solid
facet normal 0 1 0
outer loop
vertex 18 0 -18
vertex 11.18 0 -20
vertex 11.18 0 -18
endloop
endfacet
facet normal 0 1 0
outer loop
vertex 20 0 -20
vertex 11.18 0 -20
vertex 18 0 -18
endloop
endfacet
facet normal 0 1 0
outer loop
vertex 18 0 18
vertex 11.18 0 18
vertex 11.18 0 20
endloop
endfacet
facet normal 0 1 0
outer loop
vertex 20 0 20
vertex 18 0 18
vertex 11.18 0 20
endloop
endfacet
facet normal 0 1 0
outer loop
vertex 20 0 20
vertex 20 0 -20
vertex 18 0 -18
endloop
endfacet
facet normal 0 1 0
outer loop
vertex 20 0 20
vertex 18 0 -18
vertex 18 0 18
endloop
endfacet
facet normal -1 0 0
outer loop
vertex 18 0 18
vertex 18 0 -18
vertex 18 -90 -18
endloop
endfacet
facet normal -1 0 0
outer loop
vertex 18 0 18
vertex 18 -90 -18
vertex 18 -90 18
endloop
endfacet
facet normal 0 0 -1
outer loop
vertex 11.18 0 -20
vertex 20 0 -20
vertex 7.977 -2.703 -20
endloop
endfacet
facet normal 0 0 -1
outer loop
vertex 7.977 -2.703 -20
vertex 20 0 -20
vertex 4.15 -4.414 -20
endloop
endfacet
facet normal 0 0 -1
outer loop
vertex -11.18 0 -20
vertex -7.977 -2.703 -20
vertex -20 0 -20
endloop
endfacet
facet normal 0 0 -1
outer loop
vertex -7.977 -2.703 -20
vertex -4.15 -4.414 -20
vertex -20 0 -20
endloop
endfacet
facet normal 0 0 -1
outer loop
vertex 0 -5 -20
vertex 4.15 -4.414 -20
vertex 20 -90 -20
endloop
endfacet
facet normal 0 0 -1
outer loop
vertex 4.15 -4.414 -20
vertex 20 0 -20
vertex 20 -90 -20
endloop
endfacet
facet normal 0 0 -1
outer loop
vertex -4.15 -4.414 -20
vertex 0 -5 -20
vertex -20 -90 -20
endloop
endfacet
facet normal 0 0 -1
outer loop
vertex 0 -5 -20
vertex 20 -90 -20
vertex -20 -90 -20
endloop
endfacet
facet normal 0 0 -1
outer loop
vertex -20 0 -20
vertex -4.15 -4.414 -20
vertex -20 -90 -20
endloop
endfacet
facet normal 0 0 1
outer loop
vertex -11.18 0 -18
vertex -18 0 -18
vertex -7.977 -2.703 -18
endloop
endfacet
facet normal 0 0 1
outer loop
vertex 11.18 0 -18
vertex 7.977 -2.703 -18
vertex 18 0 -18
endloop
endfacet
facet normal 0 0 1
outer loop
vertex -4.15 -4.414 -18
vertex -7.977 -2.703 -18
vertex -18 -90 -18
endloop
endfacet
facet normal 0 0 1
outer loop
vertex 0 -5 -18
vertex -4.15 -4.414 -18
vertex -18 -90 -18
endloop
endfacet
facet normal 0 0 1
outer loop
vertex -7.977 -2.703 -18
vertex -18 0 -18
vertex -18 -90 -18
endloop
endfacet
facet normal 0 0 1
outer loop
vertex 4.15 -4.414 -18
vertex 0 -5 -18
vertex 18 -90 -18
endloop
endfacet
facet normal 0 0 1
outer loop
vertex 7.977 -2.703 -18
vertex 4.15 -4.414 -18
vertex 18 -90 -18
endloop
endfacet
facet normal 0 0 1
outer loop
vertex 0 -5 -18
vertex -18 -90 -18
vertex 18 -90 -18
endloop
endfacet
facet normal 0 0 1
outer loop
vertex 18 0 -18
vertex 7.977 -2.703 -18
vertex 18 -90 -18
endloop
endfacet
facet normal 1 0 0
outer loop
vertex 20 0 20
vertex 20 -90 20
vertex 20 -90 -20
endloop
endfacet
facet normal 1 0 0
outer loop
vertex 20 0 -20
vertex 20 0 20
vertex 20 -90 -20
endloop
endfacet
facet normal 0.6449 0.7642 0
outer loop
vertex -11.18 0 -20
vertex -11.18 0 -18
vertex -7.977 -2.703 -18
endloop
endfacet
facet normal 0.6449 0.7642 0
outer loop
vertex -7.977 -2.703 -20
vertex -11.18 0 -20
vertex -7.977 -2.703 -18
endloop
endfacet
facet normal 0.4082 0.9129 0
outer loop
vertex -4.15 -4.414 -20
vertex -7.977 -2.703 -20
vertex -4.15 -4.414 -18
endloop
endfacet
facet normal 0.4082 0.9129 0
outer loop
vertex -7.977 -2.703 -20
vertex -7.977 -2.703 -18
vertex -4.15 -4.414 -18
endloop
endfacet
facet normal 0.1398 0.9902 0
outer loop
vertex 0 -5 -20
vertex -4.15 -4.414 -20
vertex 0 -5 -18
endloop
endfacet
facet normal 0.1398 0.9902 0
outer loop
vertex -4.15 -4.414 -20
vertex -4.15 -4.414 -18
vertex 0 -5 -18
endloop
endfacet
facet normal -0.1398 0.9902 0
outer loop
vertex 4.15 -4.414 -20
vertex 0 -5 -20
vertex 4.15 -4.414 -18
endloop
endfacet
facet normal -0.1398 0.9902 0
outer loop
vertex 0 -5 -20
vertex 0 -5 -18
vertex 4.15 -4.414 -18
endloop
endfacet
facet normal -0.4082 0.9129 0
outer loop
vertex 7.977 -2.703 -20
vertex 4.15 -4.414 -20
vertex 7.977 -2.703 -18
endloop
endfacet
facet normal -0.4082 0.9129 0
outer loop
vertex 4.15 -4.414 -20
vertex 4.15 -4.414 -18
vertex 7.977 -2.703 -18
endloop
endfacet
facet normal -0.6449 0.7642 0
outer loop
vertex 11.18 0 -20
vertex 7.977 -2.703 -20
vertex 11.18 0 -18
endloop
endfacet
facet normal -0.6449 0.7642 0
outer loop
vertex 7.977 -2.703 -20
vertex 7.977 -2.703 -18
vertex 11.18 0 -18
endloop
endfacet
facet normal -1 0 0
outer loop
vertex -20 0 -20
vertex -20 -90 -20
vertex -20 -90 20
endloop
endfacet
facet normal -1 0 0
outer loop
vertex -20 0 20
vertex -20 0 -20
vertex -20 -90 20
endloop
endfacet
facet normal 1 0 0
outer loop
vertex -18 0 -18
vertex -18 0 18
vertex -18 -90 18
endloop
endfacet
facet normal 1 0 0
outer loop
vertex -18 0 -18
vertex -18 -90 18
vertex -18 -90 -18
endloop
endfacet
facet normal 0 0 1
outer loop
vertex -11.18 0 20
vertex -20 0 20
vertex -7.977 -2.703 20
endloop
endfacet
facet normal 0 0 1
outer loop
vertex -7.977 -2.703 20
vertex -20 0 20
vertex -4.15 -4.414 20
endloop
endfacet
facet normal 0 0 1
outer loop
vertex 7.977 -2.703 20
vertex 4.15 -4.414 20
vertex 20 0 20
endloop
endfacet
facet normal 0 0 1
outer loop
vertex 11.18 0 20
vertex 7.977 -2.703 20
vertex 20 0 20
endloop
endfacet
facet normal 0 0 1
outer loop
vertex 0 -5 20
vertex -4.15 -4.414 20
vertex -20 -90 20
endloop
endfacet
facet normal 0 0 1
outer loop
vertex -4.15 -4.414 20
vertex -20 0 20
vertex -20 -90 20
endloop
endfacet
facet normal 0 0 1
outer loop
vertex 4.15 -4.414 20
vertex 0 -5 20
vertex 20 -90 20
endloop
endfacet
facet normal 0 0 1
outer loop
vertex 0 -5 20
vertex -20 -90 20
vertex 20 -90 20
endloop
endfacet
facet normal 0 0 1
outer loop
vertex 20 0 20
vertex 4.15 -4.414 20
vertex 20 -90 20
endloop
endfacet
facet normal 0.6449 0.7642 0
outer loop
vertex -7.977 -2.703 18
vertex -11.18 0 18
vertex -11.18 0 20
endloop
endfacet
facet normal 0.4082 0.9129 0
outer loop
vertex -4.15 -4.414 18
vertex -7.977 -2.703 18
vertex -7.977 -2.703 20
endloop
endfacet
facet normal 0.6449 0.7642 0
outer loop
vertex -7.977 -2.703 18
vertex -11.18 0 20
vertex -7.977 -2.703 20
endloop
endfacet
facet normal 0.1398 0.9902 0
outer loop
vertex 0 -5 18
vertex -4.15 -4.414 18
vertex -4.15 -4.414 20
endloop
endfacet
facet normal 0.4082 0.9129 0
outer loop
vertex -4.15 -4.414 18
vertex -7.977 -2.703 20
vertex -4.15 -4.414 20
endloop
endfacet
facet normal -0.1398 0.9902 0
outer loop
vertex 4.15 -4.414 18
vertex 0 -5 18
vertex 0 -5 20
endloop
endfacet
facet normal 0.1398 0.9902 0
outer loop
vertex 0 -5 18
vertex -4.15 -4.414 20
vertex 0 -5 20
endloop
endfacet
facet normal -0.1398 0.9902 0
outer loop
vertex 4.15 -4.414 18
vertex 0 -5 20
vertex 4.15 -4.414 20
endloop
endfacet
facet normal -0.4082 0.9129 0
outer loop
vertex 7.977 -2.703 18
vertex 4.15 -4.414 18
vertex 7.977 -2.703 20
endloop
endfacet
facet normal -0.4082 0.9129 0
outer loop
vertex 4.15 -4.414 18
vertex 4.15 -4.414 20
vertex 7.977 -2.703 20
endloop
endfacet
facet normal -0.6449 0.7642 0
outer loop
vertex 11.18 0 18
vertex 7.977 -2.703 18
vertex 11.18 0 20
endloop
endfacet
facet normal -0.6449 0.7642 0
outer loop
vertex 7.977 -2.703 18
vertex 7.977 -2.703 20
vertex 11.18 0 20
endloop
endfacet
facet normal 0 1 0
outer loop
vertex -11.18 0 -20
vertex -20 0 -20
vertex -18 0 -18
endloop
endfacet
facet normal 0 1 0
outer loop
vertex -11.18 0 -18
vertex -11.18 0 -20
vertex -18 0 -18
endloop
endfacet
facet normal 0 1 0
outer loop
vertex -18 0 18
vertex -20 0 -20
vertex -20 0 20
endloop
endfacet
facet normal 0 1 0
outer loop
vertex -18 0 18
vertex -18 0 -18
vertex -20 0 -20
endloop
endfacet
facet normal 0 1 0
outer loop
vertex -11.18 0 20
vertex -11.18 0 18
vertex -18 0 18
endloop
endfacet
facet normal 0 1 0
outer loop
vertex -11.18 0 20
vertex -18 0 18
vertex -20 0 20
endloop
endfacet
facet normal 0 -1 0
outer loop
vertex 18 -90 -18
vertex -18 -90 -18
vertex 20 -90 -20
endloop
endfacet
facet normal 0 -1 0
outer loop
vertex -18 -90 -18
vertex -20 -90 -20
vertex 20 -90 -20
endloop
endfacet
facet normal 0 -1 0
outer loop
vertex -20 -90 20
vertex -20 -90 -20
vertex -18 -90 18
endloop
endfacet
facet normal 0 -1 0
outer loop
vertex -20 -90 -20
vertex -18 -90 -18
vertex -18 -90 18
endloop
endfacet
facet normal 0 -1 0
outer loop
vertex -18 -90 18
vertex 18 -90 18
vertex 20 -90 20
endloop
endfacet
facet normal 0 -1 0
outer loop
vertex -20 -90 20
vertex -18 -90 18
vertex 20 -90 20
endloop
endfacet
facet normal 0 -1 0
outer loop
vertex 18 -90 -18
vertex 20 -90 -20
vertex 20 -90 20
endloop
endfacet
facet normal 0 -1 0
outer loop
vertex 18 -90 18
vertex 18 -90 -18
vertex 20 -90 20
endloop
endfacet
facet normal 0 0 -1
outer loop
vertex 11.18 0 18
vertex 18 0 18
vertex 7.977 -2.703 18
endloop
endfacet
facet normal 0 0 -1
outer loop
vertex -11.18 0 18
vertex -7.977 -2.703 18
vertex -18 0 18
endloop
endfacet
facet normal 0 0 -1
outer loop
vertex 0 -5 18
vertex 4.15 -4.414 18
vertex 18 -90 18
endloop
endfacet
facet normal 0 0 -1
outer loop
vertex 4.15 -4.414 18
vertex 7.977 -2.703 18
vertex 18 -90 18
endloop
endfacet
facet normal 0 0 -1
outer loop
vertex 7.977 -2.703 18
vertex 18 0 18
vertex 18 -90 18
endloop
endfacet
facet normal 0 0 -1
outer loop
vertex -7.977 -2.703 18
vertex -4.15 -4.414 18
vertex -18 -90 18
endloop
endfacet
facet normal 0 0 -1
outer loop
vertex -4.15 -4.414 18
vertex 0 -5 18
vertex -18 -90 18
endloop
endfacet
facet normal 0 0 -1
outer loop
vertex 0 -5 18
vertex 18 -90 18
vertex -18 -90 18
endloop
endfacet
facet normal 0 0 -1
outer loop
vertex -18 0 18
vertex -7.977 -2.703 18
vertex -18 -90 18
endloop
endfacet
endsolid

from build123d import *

# Parameters (mm, degrees)
ESBO_O1_W             = 40
ESBO_O1_H             = 40
ESBO_O1_W_2           = 36
ESBO_O1_H_2           = 36
ESBO_O3_R             = 15
CORTE_EXTRUS_O1_DEPTH = 50


with BuildPart() as part:
    # Varredura1: sweep along a path in Esboço2
    with BuildLine(Plane(origin=(0, 0, 0), x_dir=(0, 0, -1), z_dir=(1, 0, 0))) as varredura1_path:
        Line((0, 0), (0, -90))
    # Esboço1 → Varredura1 (sweep)
    with BuildSketch(Plane(origin=(0, 0, 0), x_dir=(1, 0, 0), z_dir=(0, 1, 0))):
        Rectangle(ESBO_O1_W, ESBO_O1_H)
        Rectangle(ESBO_O1_W_2, ESBO_O1_H_2, mode=Mode.SUBTRACT)
    sweep(path=varredura1_path.line)

    # Esboço3 → Corte-extrusão1 (cut)
    with BuildSketch(Plane.XY.offset(20)):
        with Locations((0, 10)):
            Circle(ESBO_O3_R)
    extrude(amount=-CORTE_EXTRUS_O1_DEPTH, mode=Mode.SUBTRACT)


solid = part.part
